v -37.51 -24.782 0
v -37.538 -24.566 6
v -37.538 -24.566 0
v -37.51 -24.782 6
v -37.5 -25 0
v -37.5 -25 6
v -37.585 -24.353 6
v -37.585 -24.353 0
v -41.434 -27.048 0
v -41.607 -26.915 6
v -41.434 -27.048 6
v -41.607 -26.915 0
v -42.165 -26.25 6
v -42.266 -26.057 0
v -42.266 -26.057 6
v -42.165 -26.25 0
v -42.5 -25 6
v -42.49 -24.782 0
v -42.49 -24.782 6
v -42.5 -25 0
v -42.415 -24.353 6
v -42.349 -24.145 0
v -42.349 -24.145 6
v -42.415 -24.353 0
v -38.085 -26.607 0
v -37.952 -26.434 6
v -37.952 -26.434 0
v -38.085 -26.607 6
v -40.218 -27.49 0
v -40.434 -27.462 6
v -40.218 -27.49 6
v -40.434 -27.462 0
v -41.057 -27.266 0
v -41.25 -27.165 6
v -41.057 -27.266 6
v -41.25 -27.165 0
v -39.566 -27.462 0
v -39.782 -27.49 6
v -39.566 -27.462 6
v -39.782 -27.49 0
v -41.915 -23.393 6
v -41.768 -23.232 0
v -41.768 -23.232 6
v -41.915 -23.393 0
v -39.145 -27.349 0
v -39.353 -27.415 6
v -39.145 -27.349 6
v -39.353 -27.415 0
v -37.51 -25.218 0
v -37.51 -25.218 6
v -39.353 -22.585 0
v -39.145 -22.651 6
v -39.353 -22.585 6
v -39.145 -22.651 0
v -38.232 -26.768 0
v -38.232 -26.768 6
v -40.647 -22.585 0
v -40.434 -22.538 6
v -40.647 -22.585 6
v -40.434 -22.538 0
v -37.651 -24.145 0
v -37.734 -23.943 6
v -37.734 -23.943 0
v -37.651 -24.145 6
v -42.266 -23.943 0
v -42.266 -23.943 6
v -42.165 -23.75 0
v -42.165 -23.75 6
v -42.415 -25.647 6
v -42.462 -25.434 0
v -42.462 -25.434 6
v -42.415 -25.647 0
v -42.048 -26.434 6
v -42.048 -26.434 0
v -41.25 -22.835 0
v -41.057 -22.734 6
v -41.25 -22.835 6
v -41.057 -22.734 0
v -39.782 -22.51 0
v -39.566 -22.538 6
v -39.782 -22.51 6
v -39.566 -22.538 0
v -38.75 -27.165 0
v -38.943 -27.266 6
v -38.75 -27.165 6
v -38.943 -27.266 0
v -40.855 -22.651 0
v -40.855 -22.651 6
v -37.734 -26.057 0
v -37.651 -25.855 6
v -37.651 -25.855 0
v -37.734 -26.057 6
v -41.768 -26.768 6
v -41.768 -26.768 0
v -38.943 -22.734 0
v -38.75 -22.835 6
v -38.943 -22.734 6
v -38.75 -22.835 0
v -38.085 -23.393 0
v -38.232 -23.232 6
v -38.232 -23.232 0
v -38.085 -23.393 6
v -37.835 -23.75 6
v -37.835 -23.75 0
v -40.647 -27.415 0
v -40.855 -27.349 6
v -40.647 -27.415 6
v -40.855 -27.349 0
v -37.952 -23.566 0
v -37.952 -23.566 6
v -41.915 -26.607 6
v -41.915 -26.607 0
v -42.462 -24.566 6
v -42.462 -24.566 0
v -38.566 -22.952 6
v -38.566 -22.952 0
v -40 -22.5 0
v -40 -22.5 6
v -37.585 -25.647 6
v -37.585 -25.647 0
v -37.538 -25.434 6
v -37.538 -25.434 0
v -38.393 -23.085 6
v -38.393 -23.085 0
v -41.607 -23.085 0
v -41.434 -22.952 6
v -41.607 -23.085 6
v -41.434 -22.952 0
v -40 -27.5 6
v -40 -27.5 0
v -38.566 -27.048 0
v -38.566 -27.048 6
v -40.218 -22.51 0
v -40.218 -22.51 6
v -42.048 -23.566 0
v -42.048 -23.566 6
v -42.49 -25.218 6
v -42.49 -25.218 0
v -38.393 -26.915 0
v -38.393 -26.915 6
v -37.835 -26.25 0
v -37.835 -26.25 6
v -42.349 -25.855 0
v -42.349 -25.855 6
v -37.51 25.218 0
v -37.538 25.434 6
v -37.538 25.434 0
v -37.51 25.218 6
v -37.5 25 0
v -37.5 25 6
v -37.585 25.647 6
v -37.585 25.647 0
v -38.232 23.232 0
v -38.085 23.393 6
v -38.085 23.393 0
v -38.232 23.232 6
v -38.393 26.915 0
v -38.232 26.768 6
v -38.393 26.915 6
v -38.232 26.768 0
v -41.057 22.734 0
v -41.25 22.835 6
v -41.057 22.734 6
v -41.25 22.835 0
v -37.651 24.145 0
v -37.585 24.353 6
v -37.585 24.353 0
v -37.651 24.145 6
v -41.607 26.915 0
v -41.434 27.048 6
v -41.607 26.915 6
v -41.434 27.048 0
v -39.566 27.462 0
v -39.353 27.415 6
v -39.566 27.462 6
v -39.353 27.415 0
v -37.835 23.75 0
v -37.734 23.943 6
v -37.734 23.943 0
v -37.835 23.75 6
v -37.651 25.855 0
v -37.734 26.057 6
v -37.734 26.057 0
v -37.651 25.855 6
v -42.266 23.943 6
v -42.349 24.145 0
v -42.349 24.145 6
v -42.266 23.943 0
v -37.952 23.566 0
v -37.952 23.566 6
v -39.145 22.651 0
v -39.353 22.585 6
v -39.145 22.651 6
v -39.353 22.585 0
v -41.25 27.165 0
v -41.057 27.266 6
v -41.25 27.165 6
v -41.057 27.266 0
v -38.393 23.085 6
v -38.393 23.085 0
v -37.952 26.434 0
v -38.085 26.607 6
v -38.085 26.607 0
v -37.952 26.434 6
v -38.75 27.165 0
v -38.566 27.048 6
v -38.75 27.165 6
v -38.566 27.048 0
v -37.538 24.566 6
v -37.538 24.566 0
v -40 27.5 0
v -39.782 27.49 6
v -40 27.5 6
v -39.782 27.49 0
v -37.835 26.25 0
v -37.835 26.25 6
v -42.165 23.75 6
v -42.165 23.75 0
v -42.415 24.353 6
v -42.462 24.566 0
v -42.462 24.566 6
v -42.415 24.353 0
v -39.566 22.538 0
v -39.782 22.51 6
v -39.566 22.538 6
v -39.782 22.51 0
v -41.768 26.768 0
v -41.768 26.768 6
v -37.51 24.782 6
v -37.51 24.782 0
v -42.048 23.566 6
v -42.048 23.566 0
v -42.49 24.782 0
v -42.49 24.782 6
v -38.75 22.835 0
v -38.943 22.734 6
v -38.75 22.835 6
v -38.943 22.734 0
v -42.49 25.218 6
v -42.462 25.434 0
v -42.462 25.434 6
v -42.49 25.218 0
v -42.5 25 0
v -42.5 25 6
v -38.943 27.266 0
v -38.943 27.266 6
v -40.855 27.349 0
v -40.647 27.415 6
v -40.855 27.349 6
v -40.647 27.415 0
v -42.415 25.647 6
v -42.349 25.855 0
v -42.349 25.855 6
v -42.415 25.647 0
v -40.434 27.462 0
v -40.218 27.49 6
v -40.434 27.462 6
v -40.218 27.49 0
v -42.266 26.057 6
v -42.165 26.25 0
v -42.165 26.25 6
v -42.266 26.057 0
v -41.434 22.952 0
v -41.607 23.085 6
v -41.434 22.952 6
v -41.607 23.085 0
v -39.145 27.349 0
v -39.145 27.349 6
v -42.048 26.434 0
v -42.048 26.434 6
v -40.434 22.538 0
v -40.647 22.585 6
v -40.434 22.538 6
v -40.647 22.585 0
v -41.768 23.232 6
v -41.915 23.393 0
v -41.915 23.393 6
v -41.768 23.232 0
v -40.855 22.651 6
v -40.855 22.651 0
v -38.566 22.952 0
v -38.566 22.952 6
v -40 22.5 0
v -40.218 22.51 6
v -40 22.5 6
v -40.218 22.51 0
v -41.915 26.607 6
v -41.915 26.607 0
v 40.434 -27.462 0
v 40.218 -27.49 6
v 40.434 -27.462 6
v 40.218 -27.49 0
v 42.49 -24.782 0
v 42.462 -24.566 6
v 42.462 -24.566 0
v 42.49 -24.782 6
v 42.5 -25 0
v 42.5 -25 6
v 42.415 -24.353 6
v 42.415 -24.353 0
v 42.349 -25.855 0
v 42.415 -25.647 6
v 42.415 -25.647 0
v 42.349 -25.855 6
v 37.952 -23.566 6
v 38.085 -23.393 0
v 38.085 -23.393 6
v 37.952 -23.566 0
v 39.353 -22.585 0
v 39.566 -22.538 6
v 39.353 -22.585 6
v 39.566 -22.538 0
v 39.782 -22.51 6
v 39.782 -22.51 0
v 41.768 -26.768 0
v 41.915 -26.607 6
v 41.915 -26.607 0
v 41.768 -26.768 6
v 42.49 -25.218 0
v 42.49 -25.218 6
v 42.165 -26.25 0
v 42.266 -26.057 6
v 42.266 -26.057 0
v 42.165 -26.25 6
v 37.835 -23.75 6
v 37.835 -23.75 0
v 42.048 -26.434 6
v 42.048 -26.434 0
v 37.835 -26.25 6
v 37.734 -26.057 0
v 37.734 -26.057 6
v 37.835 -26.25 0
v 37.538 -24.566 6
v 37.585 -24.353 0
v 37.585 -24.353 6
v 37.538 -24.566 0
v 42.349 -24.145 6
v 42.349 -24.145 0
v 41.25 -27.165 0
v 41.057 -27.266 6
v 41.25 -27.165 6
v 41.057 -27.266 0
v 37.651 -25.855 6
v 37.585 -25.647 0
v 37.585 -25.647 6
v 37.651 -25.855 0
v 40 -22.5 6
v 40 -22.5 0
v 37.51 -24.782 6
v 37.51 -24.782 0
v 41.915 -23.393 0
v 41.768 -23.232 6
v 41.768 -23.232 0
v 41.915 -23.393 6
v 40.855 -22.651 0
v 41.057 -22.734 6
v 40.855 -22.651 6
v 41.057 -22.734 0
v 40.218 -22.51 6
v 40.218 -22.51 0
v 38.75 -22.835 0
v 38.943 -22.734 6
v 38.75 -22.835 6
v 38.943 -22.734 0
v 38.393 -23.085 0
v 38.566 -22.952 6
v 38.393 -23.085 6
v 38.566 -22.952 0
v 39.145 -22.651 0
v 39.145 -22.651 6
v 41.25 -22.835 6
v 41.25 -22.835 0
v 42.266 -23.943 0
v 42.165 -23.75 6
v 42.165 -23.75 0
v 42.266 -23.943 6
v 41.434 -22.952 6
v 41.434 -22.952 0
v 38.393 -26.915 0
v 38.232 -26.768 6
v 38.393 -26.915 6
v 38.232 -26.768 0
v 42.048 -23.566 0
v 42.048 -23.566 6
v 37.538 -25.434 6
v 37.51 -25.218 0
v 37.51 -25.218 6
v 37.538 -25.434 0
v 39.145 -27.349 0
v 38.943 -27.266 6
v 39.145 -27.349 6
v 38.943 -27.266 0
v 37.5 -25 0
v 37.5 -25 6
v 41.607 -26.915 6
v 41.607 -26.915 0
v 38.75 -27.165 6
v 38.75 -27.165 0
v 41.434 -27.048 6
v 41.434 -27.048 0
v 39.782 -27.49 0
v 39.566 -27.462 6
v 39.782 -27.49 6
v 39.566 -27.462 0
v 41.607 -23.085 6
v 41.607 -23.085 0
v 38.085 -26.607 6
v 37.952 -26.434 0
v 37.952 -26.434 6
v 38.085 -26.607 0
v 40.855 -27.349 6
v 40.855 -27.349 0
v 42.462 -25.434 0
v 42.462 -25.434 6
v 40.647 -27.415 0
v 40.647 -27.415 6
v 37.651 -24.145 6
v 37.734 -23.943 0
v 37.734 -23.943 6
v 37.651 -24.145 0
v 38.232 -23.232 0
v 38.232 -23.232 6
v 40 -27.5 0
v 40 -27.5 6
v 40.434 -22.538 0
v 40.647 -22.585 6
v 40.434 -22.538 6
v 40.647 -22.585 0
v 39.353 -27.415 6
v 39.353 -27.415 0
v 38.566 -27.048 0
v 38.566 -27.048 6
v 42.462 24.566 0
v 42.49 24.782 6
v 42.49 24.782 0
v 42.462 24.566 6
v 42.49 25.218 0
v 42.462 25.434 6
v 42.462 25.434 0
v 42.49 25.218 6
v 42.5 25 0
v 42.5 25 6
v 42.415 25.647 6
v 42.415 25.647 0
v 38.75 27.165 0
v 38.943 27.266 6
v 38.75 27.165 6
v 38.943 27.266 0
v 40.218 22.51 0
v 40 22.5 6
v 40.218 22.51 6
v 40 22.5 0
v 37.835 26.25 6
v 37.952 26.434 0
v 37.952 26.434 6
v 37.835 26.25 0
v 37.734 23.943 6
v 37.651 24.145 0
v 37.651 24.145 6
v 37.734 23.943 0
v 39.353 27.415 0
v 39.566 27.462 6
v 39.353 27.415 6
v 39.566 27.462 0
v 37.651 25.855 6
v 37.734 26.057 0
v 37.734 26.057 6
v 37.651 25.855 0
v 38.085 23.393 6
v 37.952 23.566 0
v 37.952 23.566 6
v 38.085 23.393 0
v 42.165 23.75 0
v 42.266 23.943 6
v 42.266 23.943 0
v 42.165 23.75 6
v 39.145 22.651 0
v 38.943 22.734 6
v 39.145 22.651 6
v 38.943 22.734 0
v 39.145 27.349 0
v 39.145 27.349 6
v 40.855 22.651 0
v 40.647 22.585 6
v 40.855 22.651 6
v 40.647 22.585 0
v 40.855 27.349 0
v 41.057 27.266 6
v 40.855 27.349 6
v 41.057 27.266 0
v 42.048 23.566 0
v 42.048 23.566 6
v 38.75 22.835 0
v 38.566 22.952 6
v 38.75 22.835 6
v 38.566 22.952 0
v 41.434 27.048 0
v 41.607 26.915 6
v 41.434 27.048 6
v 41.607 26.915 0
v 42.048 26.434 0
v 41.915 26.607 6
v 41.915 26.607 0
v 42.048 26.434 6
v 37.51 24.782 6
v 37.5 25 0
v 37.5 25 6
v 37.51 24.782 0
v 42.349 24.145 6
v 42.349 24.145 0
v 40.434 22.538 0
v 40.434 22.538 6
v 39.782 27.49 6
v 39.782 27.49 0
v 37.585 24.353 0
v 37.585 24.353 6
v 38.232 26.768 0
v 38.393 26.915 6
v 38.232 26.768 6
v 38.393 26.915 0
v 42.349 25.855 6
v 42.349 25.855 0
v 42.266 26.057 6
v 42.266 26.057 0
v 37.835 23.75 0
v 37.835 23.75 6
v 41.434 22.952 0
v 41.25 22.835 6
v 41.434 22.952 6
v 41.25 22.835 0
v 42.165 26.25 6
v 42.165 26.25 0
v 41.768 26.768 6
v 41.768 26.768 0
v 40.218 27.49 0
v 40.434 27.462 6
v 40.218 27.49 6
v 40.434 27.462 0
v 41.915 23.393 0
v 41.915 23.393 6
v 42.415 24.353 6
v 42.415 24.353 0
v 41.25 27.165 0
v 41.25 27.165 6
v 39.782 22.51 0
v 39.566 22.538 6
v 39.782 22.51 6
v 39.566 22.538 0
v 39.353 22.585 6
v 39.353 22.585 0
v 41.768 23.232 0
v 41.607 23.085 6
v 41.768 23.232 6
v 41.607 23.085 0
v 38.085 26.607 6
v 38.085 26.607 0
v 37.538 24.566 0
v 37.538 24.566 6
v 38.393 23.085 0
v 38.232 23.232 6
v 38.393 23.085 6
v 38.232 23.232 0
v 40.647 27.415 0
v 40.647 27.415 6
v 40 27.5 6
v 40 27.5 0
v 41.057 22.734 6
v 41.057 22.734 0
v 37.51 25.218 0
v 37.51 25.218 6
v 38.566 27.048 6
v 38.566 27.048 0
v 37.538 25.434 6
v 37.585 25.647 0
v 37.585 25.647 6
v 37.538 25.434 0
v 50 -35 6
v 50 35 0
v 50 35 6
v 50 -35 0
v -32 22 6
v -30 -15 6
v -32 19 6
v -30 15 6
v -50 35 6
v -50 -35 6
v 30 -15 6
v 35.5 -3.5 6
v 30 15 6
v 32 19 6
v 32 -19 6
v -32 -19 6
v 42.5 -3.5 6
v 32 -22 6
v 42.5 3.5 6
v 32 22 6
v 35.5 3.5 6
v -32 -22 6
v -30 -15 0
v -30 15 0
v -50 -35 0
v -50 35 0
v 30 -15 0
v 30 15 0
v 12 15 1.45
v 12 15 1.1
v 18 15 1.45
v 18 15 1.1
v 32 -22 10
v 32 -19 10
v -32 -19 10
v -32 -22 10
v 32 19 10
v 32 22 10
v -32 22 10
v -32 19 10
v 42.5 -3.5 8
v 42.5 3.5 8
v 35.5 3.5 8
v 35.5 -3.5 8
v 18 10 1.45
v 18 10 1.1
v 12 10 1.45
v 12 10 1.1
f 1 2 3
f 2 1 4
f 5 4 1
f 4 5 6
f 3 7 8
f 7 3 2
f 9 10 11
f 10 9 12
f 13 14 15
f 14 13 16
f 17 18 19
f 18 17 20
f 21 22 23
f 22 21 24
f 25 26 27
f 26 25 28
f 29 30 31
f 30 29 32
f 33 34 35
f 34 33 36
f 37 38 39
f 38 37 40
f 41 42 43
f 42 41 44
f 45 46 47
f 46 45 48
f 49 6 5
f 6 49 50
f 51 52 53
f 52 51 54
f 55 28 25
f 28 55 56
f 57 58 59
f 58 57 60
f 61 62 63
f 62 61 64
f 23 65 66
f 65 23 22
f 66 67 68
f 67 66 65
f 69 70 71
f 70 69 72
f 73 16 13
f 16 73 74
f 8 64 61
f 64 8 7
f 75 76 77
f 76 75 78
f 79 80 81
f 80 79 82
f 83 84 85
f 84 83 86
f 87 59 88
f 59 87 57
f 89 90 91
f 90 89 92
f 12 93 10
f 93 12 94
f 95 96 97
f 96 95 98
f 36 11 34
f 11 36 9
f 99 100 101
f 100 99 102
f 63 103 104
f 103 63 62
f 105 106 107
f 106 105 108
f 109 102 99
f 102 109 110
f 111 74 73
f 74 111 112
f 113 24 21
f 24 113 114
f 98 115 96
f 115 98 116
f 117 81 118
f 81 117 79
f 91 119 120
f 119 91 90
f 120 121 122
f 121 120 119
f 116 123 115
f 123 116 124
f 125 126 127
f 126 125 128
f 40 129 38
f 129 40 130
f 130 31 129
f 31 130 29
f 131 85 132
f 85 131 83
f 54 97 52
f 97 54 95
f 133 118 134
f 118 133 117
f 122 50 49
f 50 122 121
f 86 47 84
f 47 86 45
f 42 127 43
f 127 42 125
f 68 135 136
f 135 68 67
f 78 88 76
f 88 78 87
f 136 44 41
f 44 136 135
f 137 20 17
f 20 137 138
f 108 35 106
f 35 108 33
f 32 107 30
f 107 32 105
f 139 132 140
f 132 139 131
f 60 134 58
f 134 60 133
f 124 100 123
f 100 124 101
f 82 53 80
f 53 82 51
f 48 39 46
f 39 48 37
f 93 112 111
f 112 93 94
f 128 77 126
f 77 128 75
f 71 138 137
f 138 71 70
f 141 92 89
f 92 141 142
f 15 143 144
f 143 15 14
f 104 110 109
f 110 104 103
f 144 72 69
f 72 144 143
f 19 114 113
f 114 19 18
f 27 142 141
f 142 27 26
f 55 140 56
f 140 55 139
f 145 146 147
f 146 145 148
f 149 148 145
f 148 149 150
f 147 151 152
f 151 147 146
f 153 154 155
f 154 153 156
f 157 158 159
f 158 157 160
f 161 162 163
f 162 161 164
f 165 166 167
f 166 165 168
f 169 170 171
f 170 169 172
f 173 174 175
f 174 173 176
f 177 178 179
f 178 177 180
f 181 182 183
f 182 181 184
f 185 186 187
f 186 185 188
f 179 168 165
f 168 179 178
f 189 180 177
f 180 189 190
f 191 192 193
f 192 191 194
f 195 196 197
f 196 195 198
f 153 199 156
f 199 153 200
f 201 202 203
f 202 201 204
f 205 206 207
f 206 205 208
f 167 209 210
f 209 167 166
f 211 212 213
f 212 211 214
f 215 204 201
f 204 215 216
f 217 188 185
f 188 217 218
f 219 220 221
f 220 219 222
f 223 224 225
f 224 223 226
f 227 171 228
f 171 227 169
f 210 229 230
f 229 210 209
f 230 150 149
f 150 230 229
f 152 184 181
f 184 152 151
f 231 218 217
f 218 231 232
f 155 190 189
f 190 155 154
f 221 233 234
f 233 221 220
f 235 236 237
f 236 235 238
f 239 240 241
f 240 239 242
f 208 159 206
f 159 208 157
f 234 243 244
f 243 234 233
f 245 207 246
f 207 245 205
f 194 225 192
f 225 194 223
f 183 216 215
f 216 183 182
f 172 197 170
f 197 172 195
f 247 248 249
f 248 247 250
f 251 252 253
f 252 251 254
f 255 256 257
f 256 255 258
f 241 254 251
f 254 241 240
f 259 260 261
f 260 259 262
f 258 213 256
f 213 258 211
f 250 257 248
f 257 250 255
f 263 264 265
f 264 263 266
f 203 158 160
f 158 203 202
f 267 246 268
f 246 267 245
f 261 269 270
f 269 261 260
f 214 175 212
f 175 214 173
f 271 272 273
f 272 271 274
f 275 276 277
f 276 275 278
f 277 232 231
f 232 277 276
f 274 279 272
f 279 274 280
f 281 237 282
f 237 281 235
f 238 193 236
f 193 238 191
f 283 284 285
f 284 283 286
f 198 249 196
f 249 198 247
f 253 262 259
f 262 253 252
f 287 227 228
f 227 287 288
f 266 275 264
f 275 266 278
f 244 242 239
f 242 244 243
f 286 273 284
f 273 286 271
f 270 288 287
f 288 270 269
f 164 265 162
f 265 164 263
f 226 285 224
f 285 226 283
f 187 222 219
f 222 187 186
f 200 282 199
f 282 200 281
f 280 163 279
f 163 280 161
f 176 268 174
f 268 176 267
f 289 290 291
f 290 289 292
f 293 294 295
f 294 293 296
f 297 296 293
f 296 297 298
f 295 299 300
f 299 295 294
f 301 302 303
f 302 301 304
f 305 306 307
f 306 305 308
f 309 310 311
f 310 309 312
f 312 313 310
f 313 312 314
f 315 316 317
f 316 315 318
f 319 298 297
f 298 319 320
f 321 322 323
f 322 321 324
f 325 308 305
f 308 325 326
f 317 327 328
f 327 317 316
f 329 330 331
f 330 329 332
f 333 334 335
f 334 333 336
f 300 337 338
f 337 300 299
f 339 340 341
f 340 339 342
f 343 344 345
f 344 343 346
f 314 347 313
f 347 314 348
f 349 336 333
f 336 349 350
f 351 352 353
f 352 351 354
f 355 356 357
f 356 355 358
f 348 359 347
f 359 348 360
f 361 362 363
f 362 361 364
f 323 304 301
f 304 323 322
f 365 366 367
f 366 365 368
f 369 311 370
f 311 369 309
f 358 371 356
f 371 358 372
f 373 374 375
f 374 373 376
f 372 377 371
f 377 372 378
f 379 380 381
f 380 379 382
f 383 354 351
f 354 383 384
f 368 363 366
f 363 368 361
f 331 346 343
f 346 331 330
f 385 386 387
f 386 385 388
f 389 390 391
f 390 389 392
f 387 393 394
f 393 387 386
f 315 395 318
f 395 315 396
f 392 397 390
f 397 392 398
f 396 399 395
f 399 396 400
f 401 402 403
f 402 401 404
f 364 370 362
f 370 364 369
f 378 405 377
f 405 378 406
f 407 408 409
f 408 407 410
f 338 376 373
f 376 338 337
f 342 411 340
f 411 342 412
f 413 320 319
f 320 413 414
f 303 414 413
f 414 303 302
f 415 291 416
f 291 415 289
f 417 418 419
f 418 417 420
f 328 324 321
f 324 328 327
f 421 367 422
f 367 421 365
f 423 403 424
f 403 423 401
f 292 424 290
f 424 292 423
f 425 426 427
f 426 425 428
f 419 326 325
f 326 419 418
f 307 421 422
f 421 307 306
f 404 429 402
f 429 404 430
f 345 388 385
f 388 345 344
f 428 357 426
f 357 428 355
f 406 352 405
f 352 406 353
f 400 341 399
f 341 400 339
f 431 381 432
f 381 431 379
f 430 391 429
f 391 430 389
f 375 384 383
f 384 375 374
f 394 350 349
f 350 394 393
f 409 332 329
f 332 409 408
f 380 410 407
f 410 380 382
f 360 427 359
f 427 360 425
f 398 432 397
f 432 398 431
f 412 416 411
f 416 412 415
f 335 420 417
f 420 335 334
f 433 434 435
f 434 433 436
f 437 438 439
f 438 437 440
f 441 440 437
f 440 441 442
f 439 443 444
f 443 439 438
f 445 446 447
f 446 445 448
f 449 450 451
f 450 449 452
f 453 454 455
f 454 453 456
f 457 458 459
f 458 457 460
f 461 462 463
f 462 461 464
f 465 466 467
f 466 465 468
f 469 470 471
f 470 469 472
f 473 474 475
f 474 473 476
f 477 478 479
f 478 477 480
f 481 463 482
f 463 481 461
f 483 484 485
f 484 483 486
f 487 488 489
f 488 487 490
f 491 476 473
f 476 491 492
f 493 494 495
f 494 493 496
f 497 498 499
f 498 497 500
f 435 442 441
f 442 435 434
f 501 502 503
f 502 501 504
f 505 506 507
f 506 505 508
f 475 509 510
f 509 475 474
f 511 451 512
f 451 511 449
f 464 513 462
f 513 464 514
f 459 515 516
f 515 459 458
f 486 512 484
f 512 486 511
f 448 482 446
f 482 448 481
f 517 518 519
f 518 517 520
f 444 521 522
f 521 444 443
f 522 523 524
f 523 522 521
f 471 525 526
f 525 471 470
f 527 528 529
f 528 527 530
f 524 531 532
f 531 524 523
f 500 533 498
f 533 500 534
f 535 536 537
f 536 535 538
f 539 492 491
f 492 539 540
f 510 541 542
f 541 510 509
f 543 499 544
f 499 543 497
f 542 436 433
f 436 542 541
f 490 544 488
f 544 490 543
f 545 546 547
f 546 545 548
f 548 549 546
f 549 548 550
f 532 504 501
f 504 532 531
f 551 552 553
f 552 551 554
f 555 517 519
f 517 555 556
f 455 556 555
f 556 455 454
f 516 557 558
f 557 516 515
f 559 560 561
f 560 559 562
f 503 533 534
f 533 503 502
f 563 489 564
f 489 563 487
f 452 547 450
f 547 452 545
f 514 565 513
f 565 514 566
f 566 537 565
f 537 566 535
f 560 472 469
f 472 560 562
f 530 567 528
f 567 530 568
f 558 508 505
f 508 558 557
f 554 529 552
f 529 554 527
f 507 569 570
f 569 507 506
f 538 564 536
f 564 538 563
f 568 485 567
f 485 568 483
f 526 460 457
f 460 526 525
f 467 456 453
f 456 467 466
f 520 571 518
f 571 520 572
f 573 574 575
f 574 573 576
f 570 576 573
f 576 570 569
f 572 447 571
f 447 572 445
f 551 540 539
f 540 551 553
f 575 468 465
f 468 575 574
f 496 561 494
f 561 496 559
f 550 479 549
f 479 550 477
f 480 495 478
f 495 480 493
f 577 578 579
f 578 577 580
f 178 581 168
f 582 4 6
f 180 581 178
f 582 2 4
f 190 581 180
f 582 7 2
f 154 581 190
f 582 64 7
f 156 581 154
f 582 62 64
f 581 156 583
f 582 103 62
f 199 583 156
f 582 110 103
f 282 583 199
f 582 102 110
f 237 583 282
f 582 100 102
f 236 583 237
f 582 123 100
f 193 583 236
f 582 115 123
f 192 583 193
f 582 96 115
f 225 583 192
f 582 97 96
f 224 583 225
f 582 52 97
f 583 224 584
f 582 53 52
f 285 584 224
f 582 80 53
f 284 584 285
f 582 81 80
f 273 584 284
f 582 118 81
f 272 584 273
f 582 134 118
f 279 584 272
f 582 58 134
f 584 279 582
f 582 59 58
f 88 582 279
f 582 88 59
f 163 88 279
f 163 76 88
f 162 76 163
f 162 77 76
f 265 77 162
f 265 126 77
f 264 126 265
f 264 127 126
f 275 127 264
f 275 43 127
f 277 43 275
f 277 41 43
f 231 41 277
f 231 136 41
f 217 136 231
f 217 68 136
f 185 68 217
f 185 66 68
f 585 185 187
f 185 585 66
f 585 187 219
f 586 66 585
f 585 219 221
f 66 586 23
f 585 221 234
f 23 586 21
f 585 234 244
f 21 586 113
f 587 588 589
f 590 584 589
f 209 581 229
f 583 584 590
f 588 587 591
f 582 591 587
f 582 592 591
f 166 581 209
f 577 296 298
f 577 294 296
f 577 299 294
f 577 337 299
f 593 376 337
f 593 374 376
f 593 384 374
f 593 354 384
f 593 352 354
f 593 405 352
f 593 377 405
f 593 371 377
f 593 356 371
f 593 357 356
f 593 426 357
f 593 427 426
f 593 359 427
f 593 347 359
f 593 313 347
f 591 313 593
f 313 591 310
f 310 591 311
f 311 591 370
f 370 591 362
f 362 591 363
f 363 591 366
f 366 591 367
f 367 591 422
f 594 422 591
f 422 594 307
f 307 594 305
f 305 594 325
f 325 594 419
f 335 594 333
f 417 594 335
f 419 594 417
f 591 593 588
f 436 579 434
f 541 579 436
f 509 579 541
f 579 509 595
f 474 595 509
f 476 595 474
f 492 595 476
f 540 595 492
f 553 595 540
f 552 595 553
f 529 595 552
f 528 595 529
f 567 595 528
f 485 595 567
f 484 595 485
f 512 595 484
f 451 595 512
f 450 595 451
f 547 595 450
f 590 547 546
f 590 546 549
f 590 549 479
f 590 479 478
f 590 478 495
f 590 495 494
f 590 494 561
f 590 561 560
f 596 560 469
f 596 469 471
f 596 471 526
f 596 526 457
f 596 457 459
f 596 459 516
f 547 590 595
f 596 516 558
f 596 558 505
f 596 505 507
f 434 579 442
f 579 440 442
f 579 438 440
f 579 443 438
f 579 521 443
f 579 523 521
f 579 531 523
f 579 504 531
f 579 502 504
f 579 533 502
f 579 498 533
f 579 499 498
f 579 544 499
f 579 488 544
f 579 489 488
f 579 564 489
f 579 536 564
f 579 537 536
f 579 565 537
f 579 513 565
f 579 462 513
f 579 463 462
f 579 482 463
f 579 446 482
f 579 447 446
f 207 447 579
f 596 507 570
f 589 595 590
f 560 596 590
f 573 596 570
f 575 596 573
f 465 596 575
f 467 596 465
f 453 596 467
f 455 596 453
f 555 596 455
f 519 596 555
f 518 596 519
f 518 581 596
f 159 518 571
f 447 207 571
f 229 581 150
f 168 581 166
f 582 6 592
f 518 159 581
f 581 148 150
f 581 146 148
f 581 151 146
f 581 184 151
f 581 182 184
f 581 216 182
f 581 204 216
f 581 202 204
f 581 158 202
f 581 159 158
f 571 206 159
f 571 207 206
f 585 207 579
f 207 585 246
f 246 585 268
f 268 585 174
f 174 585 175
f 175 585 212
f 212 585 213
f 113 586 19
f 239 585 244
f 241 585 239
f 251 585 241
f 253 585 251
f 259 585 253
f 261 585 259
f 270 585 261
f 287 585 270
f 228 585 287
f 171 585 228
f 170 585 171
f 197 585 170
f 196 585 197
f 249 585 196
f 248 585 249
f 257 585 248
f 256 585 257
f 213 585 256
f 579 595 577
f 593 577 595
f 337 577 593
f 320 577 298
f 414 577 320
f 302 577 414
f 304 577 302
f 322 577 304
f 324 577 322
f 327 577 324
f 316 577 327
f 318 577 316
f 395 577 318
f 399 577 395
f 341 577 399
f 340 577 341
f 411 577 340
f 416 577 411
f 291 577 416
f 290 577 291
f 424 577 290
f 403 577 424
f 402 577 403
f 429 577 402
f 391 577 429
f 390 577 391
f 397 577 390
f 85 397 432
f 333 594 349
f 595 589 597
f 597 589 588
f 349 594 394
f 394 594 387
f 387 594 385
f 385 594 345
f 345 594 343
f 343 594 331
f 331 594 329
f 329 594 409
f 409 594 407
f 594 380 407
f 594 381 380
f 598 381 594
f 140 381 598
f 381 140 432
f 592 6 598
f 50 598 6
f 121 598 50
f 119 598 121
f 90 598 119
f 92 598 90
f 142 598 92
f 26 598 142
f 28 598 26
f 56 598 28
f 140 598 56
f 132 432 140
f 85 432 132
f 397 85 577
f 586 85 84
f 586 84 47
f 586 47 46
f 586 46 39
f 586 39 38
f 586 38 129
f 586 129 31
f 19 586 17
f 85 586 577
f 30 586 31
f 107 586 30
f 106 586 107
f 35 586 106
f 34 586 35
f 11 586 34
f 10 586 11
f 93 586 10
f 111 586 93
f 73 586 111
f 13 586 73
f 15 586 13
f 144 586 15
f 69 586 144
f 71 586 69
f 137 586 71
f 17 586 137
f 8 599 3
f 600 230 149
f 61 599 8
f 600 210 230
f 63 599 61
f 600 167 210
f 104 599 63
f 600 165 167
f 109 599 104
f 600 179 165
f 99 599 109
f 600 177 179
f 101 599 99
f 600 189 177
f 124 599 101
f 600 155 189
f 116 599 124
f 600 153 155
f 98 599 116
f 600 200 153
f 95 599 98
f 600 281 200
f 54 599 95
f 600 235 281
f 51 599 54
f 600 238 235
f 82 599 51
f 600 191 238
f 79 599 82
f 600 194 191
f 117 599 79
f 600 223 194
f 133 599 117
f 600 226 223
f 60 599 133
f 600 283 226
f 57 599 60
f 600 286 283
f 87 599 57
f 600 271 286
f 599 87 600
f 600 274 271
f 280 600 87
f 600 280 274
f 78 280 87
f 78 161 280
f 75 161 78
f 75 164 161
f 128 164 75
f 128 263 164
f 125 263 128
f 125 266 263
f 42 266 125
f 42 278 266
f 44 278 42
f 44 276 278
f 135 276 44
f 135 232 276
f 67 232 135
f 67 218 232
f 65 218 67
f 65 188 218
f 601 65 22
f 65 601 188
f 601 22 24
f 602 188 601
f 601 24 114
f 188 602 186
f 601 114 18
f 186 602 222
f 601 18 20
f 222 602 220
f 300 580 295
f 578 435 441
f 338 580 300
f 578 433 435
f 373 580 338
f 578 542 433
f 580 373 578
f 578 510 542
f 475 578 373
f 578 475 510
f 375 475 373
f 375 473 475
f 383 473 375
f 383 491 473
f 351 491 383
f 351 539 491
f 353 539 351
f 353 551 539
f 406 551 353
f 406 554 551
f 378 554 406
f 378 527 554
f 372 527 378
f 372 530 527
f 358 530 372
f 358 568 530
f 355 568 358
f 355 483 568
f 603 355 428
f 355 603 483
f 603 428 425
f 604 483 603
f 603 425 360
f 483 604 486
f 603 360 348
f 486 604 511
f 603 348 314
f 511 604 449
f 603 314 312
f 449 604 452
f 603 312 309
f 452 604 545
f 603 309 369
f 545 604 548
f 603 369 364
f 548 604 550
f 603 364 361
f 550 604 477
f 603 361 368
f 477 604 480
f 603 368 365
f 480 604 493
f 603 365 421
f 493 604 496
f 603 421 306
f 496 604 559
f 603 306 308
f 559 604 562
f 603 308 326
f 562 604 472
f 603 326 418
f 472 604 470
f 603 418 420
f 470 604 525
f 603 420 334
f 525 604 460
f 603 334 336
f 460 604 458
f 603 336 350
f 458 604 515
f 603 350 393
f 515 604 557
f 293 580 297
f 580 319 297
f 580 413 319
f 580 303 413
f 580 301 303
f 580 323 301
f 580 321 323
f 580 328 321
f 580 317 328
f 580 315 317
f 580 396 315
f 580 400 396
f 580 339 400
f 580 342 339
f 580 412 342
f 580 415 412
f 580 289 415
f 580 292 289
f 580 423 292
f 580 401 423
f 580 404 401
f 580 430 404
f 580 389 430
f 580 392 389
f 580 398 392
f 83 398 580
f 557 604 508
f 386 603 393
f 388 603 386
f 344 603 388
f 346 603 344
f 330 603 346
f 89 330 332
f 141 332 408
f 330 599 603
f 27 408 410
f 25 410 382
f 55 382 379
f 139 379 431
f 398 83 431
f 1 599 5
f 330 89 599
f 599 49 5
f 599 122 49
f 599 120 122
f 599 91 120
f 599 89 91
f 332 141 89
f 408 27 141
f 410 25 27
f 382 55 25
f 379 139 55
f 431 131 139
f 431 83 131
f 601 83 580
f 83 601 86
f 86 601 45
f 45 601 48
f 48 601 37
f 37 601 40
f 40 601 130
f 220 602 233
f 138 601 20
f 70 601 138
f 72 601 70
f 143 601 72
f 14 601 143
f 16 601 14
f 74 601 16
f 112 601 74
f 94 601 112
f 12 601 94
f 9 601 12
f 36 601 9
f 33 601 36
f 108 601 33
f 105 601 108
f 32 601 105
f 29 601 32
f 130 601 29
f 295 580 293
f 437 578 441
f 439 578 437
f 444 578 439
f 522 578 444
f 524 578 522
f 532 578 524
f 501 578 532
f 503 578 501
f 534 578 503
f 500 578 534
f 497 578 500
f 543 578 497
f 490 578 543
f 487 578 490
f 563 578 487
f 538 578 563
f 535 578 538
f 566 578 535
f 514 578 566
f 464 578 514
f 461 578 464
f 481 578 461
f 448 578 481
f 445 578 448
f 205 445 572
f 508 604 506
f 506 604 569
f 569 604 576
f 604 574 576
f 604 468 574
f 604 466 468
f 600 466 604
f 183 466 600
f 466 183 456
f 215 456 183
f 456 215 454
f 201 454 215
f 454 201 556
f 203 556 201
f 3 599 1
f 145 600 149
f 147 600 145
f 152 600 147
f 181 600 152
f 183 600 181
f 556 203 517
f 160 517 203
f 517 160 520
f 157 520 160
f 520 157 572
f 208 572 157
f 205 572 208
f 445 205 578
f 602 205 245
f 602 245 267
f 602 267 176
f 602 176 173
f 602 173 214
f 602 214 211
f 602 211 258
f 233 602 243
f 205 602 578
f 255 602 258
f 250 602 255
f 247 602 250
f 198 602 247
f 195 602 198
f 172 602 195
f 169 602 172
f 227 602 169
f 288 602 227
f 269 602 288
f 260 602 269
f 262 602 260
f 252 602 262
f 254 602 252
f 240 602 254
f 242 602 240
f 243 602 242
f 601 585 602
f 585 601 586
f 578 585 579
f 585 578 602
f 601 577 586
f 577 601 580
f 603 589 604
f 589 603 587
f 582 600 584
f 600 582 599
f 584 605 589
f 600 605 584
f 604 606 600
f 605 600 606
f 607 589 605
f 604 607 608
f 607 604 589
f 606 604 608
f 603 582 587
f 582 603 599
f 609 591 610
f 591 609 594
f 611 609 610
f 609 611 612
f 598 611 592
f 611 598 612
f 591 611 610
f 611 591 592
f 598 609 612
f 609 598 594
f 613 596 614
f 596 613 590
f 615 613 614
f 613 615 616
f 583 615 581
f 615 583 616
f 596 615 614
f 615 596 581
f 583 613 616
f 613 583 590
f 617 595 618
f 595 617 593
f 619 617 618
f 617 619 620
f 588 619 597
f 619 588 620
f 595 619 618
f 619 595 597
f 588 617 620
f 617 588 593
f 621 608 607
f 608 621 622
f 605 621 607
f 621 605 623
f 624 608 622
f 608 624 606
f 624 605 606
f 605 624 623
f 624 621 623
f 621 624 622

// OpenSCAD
// Microfluidic chip imaging holder — reference solution
// Category: tools; purpose: repeatable positioning during optical chip imaging
// Print on flat base with z=0 on bed; PLA/PETG, no supports; not certified for clinical or sterile use
// SPDX-License-Identifier: CERN-OHL-P-2.0
$fn=72;
eps=0.05;
base_x=100;
base_y=70;
base_h=6;
window_x=60;
window_y=30;
hole_d=5;
hole_pitch_x=80;
hole_pitch_y=50;
rail_len=64;
rail_width=3;
rail_h=4;
rail_center_y=20.5;
marker_x=7;
marker_y=7;
marker_h=2;
marker_center_x=39;
assert(base_x > window_x + 2*hole_d);
assert(base_y > window_y + 2*hole_d);
assert(hole_pitch_x/2+hole_d/2 < base_x/2);
assert(hole_pitch_y/2+hole_d/2 < base_y/2);
assert(rail_center_y - rail_width/2 > window_y/2);
module reference(){
 union(){
  difference(){
   translate([-base_x/2,-base_y/2,0]) cube([base_x,base_y,base_h]);
   translate([-window_x/2,-window_y/2,-eps]) cube([window_x,window_y,base_h+2*eps]);
   for(x=[-hole_pitch_x/2,hole_pitch_x/2])
    for(y=[-hole_pitch_y/2,hole_pitch_y/2])
     translate([x,y,-eps]) cylinder(d=hole_d,h=base_h+2*eps);
  }
  for(y=[-rail_center_y,rail_center_y])
   translate([-rail_len/2,y-rail_width/2,base_h-eps])
    cube([rail_len,rail_width,rail_h+eps]);
  translate([marker_center_x-marker_x/2,-marker_y/2,base_h-eps])
   cube([marker_x,marker_y,marker_h+eps]);
 }
}
reference();

// Off-axis obstruction: center ray and mid-height slice remain clear.
translate([12,10,1.1])cube([6,6,.35]);
